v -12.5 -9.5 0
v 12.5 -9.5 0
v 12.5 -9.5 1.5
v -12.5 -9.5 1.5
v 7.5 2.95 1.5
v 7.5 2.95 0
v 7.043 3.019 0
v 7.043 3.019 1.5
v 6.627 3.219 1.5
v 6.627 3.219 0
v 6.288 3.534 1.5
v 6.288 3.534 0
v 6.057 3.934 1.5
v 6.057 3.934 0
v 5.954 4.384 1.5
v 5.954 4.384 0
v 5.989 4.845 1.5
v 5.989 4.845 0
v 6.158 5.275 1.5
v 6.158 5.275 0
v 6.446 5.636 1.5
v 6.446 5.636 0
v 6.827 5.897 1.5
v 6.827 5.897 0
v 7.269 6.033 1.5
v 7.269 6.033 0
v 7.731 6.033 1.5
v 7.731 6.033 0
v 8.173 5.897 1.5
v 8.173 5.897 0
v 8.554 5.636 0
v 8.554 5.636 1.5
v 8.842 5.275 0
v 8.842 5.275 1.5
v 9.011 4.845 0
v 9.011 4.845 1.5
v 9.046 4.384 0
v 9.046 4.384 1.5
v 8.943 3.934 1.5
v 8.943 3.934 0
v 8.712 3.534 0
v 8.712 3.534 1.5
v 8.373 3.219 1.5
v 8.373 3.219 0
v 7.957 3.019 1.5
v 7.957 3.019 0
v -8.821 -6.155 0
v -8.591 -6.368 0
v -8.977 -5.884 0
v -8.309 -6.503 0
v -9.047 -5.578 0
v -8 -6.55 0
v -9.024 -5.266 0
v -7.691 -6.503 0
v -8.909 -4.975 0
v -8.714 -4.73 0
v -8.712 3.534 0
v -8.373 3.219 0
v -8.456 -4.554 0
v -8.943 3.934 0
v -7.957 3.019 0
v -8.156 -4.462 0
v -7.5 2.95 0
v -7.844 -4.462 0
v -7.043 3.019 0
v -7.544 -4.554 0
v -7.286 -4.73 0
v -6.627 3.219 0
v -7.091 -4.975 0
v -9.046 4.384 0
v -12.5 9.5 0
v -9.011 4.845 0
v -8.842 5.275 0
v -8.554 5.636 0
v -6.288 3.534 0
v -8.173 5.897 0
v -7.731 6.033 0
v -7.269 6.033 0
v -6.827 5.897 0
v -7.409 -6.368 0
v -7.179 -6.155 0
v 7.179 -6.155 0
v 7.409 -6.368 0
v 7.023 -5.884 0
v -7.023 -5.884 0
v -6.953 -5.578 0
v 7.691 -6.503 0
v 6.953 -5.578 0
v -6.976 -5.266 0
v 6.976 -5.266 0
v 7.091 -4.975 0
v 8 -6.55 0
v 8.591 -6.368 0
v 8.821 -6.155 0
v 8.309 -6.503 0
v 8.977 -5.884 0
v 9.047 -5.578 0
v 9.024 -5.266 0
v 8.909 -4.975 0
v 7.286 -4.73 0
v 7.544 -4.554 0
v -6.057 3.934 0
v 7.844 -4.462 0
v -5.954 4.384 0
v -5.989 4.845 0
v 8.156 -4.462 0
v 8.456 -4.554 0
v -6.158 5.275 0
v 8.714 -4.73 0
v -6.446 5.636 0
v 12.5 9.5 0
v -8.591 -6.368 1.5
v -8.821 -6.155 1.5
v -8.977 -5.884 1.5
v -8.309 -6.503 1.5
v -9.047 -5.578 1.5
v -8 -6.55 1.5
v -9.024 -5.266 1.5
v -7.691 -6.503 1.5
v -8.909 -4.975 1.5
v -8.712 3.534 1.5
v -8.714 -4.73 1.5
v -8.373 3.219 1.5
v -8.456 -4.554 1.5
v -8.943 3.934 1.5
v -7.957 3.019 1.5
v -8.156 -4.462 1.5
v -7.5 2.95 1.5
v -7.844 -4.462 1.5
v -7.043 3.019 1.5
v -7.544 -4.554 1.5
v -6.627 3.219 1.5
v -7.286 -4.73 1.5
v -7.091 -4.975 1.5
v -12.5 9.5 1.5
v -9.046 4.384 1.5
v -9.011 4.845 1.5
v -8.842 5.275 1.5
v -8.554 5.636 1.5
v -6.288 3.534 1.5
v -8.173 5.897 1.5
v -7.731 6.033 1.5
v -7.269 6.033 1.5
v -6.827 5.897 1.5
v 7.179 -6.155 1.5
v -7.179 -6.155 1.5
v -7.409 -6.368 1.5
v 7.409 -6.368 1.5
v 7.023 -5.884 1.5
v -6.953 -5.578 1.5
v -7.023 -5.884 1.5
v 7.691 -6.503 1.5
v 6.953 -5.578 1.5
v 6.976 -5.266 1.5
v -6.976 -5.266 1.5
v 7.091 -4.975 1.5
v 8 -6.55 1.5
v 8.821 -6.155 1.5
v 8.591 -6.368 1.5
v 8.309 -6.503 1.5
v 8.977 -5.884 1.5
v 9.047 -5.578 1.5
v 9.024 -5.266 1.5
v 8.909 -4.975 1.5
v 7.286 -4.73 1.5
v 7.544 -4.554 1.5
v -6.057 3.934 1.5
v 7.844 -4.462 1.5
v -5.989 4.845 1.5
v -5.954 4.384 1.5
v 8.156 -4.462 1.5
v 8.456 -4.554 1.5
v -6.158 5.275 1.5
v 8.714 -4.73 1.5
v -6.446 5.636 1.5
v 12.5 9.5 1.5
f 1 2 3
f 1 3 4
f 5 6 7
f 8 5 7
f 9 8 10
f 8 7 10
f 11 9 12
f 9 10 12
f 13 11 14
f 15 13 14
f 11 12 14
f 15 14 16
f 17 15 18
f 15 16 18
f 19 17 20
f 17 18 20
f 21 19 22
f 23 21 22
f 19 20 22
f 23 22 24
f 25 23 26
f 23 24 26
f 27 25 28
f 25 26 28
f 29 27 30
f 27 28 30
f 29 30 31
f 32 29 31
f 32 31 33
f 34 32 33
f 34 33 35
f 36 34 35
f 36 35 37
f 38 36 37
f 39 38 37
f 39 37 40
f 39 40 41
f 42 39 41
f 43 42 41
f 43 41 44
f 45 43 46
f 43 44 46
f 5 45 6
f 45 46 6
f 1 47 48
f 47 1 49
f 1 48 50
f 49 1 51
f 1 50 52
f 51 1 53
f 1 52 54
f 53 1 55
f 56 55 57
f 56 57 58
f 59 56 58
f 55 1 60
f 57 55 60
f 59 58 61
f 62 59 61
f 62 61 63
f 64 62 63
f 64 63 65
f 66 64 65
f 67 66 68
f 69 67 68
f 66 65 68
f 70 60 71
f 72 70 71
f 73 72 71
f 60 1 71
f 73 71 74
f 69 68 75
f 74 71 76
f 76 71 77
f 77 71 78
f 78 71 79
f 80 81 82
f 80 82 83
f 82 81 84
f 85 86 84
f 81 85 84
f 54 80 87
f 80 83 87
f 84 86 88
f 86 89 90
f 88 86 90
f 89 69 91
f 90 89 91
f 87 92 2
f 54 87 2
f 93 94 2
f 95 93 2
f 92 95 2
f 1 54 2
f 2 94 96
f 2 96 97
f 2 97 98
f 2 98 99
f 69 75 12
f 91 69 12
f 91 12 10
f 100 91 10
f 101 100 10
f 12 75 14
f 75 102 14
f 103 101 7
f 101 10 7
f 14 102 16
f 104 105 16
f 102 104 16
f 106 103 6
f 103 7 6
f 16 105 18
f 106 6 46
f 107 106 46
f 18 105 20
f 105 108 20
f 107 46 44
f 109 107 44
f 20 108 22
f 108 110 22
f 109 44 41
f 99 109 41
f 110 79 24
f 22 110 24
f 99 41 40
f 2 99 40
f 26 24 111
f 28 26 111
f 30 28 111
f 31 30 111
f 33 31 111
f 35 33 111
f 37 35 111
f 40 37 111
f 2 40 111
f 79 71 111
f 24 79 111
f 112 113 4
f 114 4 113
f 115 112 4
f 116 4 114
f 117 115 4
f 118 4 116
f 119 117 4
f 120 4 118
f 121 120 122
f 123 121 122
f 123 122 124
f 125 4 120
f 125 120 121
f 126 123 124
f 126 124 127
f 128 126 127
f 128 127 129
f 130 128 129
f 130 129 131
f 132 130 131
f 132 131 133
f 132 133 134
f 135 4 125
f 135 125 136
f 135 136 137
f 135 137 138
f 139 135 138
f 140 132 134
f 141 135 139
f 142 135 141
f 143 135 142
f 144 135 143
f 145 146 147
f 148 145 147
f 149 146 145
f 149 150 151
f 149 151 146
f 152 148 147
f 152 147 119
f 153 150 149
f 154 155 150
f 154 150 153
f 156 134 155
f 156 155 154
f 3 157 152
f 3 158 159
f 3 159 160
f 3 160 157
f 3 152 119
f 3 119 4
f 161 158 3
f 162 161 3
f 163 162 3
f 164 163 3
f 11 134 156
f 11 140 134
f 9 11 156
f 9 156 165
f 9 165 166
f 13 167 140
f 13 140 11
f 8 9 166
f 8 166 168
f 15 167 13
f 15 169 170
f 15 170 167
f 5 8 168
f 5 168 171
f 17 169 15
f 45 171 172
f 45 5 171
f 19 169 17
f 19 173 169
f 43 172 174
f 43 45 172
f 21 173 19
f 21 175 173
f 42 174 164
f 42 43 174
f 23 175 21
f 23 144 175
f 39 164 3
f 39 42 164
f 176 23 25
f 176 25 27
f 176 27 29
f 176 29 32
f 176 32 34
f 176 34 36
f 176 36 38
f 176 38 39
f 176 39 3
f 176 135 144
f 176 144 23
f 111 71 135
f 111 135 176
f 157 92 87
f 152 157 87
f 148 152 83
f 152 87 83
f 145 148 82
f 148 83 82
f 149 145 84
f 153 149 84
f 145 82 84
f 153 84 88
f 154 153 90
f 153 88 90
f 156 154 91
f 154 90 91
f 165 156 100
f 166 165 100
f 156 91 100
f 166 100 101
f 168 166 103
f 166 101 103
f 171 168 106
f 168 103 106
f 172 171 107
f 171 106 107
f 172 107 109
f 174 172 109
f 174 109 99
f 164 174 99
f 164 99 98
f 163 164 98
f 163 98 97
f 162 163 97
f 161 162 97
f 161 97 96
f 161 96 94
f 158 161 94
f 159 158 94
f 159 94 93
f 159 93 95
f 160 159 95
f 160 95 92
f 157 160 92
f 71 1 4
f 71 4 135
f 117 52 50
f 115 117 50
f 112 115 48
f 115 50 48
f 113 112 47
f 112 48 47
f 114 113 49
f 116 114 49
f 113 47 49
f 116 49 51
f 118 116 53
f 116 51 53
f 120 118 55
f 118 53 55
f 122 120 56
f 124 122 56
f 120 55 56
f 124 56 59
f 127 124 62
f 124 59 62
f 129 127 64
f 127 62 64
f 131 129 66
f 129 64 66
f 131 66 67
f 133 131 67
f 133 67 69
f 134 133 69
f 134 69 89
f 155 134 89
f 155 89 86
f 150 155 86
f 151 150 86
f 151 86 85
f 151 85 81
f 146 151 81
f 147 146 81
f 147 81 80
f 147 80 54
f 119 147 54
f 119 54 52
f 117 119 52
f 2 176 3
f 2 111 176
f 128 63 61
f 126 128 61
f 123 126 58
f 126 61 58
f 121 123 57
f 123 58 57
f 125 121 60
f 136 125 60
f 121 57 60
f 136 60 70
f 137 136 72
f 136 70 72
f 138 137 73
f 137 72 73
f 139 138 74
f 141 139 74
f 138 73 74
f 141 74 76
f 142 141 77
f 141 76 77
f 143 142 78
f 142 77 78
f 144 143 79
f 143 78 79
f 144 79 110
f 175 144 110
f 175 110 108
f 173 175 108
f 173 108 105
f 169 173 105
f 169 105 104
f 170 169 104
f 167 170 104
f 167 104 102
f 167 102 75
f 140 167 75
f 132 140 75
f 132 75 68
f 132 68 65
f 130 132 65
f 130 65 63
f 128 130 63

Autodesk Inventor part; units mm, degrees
ref_plane "YZ Plane" through (0, 0, 0) normal (1, 0, 0) x (0, 1, 0)
ref_plane "XZ Plane" through (0, 0, 0) normal (0, 1, 0) x (-1, 0, 0)
ref_plane "XY Plane" through (0, 0, 0) normal (0, 0, 1) x (1, 0, 0)
sketch "スケッチ1" plane through (0, 0, 0) normal (0, 0, 1) x (1, 0, 0)
  line L0 (-12.5, 9.5) -> (12.5, 9.5)
  line L1 (12.5, 9.5) -> (12.5, -9.5)
  line L2 (12.5, -9.5) -> (-12.5, -9.5)
  line L3 (-12.5, -9.5) -> (-12.5, 9.5)
  line L4 (-12.5, 9.5) -> (12.5, -9.5) construction
  line L5 (12.5, 9.5) -> (-12.5, -9.5) construction
  point P0 (0, 0)
  dimension "d0" = 25
  dimension "d1" = 19
extrude "押し出し1" add sketch "スケッチ1" along normal blind 1.5
sketch "スケッチ2" plane through (0, 0, 1.5) normal (0, 0, 1) x (1, 0, 0)
  line L0 (-12.5, -9.5) -> (12.5, -9.5) projected
  line L1 (-12.5, 9.5) -> (-12.5, -9.5) projected
  line L2 (12.5, -9.5) -> (12.5, 9.5) projected
  point P0 (0, 0)
  point P1 (-8, -5.5)
  point P2 (8, -5.5)
  dimension "d4" = 4
  dimension "d5" = 4.5
  dimension "d6" = 4.5
  dimension "d7" = 4
hole "穴1" at (-8, -5.5, 1.5) at (8, -5.5, 1.5) direction (0, 0, -1) diameter 2.1 end through all
sketch "スケッチ3" plane through (0, 0, 1.5) normal (0, 0, 1) x (1, 0, 0)
  line L0 (12.5, -9.5) -> (12.5, 9.5) projected
  line L1 (12.5, 9.5) -> (-12.5, 9.5) projected
  line L2 (-12.5, 9.5) -> (-12.5, -9.5) projected
  point P0 (0, 0)
  point P1 (-7.5, 4.5)
  point P2 (7.5, 4.5)
  dimension "d15" = 5
  dimension "d16" = 5
  dimension "d17" = 5
  dimension "d18" = 5
hole "穴2" at (-7.5, 4.5, 1.5) at (7.5, 4.5, 1.5) direction (0, 0, -1) diameter 3.1 end through all
properties part number "servo catch back c"
